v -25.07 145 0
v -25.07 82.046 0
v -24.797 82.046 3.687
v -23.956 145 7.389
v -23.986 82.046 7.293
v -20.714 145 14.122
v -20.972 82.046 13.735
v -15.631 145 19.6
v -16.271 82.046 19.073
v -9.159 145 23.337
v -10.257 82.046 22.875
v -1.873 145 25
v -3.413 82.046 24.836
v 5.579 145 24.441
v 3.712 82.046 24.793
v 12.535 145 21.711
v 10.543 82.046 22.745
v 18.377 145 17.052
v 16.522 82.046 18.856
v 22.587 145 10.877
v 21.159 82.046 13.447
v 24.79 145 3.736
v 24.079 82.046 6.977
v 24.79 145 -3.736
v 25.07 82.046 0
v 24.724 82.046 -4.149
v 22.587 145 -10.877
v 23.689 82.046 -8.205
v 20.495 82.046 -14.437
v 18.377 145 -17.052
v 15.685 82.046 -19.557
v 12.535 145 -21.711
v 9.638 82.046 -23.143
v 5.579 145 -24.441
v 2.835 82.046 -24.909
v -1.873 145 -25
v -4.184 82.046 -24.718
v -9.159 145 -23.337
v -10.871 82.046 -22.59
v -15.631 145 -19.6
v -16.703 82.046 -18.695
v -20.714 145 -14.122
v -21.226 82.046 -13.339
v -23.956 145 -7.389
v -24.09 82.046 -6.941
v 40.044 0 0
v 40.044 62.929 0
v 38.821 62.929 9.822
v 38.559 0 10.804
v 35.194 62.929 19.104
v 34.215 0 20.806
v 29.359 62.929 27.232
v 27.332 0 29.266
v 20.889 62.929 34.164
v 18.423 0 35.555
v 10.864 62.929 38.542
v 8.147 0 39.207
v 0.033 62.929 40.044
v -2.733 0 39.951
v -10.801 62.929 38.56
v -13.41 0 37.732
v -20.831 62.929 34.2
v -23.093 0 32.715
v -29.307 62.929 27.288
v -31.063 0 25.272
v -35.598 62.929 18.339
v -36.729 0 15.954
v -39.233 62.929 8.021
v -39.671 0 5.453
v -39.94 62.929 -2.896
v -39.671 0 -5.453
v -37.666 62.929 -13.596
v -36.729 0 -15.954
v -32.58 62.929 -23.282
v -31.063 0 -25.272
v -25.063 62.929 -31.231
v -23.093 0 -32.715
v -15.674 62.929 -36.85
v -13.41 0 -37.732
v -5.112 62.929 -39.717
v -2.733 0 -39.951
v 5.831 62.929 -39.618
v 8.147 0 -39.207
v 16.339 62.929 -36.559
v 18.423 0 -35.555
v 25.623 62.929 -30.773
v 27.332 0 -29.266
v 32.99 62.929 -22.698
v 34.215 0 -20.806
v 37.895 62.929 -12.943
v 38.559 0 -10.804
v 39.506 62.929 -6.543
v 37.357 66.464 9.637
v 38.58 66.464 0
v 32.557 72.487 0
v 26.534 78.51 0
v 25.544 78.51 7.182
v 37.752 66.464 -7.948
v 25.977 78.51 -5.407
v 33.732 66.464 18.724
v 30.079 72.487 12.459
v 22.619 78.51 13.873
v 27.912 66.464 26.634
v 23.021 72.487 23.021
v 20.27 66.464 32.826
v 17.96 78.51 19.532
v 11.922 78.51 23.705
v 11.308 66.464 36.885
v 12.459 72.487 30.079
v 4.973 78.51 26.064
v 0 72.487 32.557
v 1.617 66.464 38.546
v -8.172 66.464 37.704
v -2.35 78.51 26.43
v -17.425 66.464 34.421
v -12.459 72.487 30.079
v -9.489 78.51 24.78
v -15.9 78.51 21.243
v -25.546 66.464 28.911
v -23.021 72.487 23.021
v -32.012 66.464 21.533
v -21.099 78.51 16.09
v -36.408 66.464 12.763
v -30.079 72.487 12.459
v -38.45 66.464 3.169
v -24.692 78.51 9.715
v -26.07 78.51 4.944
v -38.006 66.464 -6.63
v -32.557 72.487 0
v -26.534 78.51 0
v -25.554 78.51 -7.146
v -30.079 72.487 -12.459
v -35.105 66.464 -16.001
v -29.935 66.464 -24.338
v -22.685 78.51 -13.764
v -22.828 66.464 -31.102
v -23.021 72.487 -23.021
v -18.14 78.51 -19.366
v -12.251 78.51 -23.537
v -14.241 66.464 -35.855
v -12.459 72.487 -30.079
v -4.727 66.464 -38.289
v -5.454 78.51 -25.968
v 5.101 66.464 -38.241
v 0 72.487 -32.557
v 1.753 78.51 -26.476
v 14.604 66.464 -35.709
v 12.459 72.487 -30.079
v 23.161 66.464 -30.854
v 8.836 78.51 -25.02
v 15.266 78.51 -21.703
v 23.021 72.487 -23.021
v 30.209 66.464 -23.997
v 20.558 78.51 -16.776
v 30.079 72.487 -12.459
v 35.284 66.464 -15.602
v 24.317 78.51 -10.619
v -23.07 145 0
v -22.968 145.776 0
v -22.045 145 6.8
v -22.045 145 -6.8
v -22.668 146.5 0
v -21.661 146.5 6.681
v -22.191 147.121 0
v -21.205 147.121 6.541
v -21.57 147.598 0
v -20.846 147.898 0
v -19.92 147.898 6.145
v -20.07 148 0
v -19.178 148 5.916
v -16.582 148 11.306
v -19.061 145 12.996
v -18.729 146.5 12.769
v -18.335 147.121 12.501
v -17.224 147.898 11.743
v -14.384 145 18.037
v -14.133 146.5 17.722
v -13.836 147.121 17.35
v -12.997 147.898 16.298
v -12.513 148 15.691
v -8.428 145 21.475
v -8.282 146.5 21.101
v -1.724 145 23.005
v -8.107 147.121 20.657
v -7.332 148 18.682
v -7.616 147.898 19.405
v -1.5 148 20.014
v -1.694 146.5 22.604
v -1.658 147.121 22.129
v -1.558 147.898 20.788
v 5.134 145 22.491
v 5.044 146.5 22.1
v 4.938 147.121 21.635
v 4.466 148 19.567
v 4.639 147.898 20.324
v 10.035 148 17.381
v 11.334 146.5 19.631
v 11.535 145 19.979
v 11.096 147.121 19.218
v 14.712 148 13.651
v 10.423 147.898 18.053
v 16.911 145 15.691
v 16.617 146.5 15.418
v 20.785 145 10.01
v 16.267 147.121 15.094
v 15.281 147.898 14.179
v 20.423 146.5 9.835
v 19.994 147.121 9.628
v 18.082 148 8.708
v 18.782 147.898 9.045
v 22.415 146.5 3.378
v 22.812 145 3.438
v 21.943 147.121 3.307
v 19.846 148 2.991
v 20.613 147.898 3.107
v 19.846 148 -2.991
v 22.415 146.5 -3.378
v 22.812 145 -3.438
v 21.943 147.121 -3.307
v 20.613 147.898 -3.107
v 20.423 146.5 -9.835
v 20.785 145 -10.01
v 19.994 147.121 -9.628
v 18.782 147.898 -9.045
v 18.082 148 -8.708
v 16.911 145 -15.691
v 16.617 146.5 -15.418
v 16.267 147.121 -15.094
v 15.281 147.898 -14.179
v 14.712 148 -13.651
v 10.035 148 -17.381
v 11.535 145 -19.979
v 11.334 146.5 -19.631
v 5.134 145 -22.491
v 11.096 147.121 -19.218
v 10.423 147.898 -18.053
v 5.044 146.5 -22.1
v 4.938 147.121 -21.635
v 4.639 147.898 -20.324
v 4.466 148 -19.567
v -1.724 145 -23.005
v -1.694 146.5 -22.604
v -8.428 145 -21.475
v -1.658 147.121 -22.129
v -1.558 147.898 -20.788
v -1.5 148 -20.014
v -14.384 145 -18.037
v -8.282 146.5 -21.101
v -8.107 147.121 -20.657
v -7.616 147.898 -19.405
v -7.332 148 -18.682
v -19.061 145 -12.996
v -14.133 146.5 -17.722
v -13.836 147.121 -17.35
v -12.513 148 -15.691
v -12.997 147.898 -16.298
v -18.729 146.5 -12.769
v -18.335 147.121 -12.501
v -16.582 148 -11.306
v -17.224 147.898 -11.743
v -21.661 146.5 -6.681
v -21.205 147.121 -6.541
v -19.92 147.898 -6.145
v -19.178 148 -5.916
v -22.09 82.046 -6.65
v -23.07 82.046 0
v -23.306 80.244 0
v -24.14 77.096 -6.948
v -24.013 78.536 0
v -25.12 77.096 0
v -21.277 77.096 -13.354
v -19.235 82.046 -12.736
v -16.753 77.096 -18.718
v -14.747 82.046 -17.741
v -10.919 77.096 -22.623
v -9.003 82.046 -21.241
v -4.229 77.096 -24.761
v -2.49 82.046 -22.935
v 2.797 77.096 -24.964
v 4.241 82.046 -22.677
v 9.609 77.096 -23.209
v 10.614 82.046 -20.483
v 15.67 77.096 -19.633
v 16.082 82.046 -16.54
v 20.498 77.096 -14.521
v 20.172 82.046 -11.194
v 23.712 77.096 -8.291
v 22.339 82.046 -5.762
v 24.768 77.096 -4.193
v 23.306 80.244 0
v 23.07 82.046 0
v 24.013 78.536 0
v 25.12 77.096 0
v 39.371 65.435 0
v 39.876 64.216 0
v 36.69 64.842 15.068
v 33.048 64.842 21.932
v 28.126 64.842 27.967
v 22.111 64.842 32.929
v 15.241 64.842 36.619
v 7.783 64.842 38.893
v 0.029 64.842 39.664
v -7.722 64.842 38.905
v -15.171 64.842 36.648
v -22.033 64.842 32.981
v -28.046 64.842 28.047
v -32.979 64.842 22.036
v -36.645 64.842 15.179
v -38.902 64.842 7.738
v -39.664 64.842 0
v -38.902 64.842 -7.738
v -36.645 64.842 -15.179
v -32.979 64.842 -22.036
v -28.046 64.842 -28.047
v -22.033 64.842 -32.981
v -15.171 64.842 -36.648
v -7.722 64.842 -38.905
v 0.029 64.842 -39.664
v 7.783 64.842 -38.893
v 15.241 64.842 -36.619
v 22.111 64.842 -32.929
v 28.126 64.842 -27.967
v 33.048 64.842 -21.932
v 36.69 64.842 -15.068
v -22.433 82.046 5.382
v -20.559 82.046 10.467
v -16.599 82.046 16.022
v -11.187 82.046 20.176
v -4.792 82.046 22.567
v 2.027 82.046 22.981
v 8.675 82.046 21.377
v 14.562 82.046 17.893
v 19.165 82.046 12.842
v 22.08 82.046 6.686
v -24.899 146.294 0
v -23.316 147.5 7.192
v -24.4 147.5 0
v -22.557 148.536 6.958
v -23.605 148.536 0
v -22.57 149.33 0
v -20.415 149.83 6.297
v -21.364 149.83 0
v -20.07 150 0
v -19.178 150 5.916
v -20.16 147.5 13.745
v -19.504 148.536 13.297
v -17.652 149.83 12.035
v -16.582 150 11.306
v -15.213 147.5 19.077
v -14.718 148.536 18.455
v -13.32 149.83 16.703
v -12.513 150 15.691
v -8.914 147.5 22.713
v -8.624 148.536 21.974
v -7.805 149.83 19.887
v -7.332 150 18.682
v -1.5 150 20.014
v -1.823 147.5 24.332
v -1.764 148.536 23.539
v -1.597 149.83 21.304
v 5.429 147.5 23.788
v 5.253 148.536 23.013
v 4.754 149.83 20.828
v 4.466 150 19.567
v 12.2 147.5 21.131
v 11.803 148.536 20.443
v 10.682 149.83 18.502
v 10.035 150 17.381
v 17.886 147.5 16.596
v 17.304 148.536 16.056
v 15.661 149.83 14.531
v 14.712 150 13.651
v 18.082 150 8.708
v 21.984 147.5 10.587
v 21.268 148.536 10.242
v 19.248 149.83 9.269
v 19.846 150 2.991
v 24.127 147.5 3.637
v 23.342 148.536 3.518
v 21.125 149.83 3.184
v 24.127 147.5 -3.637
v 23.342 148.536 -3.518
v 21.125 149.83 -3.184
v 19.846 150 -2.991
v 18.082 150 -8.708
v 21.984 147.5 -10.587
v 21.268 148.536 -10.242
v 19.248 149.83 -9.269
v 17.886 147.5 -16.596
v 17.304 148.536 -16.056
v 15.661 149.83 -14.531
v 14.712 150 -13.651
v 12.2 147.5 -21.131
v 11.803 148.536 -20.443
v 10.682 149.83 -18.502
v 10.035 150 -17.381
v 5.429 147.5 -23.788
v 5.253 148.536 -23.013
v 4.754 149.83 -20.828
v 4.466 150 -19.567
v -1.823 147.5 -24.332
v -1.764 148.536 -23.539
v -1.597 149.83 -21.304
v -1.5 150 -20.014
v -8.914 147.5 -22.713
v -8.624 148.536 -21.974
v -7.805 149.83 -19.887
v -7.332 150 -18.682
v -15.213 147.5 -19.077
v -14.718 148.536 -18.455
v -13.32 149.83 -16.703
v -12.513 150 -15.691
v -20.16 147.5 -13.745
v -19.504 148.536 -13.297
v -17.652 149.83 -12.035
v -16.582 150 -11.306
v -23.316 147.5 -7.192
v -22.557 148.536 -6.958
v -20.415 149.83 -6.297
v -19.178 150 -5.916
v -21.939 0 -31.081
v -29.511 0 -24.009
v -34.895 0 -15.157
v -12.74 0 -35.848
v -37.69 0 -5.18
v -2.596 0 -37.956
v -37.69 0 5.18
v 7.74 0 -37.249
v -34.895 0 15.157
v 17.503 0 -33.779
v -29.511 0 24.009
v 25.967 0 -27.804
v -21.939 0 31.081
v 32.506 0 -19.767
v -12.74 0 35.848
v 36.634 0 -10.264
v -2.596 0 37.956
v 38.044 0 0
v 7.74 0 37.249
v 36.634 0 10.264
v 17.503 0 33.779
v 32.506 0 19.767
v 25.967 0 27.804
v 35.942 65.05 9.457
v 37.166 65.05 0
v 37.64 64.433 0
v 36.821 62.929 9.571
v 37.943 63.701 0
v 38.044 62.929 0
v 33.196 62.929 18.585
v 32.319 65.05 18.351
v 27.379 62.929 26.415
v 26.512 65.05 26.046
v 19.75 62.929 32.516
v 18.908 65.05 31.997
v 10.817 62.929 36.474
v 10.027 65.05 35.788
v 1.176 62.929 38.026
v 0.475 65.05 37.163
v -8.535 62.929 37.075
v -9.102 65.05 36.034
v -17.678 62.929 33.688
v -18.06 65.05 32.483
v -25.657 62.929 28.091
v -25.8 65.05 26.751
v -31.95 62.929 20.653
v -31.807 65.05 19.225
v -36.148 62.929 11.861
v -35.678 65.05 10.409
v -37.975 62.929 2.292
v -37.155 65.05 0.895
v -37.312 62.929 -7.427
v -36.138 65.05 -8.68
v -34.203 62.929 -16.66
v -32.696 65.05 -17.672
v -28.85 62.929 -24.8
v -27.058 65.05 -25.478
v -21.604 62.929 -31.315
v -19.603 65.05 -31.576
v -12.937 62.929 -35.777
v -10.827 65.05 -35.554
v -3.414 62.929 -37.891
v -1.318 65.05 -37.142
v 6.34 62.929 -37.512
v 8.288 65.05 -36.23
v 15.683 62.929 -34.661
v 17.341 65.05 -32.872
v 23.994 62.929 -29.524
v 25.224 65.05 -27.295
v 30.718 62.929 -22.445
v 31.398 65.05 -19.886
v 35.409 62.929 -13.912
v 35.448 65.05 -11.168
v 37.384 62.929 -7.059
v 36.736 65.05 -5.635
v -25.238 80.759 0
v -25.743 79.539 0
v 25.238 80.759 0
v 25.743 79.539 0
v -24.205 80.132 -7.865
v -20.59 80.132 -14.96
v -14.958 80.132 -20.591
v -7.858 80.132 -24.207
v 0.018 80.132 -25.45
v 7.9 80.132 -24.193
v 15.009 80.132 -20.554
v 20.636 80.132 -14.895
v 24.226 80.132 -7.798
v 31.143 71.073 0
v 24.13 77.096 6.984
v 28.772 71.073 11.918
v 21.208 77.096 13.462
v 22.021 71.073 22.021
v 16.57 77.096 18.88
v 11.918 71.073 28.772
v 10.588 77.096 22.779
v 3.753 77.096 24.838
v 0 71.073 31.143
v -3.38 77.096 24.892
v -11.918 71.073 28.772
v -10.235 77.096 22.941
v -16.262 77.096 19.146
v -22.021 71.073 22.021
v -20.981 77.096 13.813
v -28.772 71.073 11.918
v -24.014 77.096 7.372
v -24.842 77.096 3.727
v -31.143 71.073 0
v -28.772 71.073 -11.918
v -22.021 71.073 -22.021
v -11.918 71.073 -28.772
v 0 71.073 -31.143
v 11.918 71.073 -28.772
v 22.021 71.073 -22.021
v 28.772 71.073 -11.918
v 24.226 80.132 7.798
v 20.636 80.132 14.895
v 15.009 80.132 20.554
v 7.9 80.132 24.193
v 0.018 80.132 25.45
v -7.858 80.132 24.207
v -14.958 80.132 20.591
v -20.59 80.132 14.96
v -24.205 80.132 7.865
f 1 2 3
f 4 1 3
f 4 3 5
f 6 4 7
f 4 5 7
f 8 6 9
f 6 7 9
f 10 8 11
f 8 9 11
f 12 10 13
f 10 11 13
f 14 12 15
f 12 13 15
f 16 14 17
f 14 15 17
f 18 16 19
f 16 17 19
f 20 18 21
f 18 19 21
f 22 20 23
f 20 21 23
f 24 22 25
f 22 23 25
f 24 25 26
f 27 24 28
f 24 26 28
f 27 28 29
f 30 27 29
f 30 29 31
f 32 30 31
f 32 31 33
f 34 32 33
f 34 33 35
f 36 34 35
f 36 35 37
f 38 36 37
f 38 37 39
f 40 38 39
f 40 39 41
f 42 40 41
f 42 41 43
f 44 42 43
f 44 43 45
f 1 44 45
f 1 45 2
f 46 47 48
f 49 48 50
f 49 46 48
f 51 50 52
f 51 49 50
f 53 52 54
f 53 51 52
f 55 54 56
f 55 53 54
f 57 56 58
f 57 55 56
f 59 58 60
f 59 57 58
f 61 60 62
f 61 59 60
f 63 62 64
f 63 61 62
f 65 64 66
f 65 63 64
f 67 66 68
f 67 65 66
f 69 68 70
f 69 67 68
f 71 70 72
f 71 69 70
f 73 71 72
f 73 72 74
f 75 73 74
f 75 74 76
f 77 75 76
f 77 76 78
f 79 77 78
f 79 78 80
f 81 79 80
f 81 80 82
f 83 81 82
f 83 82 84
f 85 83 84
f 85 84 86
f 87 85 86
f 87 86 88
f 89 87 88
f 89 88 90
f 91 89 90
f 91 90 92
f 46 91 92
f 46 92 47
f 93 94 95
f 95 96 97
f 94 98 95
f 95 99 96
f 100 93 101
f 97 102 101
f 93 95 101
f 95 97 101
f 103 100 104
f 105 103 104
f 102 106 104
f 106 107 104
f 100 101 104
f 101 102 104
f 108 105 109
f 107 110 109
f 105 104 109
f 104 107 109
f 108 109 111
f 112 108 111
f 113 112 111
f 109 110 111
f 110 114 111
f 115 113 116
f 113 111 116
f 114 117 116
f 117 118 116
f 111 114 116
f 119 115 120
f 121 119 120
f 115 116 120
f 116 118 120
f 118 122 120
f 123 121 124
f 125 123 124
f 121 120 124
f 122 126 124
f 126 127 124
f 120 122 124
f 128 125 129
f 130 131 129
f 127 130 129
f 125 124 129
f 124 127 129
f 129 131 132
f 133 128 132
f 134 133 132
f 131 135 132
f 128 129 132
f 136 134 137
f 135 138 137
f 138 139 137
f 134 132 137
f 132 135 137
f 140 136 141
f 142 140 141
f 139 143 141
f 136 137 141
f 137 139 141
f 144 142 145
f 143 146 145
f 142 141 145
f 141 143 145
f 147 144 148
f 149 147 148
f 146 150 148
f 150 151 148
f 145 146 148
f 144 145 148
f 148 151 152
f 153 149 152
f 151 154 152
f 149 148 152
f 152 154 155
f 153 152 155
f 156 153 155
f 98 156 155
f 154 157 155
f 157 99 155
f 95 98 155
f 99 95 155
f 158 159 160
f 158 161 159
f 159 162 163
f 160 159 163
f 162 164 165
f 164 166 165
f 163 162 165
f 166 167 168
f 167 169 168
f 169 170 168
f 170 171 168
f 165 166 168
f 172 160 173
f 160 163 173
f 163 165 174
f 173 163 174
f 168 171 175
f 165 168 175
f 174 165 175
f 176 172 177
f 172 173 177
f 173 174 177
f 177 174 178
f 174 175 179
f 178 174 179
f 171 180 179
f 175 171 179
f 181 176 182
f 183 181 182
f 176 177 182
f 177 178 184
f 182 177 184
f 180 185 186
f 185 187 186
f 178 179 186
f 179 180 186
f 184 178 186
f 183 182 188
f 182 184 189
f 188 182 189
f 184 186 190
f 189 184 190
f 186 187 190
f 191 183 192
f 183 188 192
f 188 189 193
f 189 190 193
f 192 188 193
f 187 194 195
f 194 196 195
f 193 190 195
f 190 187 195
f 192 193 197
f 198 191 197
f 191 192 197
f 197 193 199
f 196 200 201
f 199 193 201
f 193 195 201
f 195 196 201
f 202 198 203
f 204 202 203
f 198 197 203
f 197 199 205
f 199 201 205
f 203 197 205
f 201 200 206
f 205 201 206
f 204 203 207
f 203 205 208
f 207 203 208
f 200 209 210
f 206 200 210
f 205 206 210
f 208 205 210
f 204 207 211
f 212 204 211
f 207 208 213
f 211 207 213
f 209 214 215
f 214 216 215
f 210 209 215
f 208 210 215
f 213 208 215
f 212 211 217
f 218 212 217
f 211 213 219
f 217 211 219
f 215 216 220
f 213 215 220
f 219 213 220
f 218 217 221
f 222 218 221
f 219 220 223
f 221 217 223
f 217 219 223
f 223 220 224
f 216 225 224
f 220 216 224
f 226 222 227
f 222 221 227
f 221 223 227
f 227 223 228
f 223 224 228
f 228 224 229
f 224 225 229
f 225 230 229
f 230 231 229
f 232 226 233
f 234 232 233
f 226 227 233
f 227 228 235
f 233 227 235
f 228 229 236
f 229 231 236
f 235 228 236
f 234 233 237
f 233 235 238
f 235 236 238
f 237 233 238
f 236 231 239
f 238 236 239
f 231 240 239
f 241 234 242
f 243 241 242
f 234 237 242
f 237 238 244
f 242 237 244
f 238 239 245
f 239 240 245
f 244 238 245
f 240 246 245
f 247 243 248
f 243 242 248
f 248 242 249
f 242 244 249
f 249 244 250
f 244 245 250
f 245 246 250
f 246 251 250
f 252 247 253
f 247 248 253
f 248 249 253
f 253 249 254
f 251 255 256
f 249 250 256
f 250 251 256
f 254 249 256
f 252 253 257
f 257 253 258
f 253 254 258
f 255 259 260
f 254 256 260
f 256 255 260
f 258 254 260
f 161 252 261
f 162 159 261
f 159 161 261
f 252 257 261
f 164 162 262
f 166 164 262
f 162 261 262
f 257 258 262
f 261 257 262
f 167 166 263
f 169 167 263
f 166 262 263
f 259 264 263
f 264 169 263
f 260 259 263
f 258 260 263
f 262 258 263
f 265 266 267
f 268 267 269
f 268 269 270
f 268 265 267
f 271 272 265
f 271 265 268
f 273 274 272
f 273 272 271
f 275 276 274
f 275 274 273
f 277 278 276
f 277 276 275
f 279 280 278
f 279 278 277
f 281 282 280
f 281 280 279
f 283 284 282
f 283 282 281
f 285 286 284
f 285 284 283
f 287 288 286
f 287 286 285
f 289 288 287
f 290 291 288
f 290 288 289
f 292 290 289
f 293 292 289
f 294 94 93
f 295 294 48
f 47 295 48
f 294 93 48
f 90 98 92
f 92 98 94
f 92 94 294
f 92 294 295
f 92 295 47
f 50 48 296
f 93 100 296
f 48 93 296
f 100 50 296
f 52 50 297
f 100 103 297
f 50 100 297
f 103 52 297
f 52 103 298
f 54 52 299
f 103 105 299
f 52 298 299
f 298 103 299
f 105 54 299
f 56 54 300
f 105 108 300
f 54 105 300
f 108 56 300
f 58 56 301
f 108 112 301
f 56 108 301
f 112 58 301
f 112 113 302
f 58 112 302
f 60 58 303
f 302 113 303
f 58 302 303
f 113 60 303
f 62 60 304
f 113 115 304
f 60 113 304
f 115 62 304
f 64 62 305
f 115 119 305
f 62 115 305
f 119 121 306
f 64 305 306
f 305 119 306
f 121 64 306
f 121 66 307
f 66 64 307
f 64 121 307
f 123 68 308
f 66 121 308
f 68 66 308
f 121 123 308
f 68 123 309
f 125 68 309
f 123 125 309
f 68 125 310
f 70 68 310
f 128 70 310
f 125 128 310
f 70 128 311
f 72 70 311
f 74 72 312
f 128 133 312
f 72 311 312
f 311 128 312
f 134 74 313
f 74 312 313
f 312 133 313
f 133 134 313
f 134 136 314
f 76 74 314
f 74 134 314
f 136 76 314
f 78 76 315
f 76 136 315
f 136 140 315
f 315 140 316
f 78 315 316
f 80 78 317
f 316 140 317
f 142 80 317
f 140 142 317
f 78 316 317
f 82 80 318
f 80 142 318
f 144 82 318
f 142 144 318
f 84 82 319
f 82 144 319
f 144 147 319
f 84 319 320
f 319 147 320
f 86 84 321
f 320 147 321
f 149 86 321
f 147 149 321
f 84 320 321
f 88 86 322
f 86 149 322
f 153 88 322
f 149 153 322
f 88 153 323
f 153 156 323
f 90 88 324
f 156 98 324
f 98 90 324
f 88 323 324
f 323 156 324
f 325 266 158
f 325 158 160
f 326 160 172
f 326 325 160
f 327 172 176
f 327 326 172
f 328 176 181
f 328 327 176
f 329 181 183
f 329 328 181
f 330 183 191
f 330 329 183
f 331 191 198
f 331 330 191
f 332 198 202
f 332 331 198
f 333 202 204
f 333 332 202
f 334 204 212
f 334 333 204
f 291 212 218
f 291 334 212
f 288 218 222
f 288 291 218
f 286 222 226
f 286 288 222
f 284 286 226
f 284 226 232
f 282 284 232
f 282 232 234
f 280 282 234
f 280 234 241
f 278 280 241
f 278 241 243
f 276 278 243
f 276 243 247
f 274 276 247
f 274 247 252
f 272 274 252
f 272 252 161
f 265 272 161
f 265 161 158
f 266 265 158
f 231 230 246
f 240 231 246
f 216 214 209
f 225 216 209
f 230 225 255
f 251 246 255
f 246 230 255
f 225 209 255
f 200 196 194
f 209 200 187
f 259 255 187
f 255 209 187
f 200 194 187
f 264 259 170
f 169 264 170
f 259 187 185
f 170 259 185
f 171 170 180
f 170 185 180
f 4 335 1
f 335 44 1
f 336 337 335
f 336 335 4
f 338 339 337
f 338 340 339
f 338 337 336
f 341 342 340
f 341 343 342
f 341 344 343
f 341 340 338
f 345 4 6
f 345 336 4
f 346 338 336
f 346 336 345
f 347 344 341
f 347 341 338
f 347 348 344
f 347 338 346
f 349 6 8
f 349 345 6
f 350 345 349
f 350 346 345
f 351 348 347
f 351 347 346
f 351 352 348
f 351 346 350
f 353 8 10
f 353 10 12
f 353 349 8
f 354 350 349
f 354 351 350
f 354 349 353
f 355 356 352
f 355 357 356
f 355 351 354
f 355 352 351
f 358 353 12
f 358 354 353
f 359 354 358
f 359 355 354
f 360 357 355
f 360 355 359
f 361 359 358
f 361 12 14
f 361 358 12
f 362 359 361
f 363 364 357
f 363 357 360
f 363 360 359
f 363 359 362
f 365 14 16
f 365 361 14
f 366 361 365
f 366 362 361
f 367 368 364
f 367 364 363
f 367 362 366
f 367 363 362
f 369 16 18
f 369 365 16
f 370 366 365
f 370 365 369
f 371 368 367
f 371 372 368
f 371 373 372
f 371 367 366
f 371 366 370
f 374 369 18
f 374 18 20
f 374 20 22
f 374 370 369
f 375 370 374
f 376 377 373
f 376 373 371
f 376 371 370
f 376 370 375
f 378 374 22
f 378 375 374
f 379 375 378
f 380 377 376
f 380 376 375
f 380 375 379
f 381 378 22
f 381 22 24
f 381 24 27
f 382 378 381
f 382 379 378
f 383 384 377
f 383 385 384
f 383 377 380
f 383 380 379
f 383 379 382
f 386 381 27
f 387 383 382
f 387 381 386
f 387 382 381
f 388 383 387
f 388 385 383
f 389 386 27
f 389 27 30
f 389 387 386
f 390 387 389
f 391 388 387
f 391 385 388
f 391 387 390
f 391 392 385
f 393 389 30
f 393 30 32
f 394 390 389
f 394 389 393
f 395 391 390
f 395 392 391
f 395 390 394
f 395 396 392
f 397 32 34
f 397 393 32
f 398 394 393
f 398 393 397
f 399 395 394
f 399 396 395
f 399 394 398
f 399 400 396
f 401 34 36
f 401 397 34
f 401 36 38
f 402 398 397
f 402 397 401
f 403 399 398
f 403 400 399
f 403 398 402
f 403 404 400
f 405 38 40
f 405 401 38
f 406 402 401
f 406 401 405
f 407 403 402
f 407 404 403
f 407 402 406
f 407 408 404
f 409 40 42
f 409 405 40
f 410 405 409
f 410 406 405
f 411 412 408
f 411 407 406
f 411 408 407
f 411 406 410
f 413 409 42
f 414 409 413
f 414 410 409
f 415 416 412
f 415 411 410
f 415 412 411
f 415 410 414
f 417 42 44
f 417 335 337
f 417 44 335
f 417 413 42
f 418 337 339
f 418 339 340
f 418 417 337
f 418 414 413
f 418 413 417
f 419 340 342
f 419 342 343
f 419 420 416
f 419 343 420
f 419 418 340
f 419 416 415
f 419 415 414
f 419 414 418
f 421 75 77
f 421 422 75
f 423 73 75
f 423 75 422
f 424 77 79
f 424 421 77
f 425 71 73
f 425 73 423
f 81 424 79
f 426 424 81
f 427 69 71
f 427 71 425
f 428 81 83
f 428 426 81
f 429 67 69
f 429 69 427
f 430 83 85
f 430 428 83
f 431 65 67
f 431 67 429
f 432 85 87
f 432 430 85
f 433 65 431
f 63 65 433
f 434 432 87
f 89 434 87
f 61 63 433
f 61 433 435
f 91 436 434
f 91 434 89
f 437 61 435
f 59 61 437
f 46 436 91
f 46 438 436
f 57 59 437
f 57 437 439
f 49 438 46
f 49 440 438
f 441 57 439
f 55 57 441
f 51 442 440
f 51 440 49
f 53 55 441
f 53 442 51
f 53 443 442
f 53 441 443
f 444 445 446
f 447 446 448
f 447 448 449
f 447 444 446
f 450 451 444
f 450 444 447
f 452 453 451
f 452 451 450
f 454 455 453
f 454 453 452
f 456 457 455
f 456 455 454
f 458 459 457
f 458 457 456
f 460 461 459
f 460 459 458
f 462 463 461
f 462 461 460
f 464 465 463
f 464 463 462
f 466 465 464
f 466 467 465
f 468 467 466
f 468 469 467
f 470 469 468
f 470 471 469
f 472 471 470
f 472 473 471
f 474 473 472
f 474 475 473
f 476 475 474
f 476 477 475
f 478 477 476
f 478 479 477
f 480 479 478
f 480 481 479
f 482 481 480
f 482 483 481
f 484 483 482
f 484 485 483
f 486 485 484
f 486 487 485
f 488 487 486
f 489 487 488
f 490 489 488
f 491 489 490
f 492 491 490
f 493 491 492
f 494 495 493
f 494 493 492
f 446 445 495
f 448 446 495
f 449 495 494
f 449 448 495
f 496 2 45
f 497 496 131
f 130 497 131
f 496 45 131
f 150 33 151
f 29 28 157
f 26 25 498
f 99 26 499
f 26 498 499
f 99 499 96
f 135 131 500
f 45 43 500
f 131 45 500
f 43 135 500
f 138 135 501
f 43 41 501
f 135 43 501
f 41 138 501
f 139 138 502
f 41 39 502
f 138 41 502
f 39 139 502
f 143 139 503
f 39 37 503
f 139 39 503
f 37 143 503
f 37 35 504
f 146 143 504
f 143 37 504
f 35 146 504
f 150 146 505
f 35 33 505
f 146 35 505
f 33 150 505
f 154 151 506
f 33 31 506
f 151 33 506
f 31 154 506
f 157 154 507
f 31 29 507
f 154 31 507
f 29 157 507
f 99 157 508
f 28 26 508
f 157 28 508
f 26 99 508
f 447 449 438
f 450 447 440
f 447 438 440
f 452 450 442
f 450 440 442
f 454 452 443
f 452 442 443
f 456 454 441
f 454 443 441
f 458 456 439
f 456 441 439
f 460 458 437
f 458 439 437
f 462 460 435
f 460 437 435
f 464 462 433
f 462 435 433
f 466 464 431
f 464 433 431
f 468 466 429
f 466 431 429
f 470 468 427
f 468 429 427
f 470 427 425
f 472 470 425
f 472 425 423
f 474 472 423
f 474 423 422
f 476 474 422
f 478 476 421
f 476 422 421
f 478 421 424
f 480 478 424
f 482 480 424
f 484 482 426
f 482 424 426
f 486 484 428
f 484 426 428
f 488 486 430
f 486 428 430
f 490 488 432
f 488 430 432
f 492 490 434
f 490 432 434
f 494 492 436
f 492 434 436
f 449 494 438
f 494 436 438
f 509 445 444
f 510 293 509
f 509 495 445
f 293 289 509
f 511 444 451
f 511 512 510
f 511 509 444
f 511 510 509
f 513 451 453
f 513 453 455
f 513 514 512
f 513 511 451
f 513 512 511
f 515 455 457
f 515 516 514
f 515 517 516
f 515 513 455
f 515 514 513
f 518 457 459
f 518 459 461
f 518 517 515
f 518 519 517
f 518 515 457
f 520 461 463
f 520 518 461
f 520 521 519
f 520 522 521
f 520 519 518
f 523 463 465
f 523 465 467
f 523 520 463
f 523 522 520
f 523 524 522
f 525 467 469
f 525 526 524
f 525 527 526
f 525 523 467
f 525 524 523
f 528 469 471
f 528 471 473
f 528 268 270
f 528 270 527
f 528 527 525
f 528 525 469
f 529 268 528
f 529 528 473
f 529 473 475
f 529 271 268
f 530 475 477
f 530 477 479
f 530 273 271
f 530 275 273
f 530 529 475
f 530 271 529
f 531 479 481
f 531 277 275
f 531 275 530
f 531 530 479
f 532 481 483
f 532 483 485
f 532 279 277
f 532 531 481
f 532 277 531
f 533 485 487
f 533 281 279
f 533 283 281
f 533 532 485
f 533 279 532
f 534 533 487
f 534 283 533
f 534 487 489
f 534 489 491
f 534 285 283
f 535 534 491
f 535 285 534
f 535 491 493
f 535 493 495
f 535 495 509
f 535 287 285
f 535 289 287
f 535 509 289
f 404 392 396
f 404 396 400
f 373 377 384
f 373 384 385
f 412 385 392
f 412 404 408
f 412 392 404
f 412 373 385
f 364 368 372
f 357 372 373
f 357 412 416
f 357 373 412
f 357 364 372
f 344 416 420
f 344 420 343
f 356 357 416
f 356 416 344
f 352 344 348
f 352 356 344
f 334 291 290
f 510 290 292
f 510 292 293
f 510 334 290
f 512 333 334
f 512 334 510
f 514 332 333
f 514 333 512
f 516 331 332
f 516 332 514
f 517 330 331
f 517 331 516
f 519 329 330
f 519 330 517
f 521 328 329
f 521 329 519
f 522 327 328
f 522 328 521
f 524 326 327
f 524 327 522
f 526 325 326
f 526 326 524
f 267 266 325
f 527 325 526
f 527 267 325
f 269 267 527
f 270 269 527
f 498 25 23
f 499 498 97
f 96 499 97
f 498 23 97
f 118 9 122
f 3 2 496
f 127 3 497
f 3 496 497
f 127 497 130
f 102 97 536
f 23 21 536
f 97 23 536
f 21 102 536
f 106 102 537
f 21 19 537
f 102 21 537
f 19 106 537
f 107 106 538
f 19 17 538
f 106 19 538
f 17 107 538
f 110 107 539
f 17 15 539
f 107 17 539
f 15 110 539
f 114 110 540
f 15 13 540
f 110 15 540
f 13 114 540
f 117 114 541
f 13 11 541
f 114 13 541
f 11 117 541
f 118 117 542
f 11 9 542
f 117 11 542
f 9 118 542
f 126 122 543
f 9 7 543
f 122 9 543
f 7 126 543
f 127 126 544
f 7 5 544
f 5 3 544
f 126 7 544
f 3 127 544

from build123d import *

# Parameters (mm, degrees)
F0_R        = 40.0443714264
F1_DEPTH    = 80
F2_R        = 25.0697968859
F3_DEPTH    = 70
F4_S5_R     = 25.0697968859
F4_T6_DEPTH = 59
F5_R        = 5
F6_R        = 5
F7_T        = -2


# Not quite as in the source:
# - a fillet or chamfer that OpenCascade refuses, or shapes differently, is made with other operations: its cross-section is extruded or revolved along the edge and cut away or added


with BuildPart() as f1:
    # F0 (on Front) → F1 (new body)
    with BuildSketch(Plane.XZ):
        Circle(F0_R)
    extrude(amount=-F1_DEPTH)

    # F2 (on face) → F3 (join)
    with BuildSketch(Plane(origin=(0, 80, 0), x_dir=(-1, 0, 0), z_dir=(0, 1, 0))):
        Circle(F2_R)
    extrude(amount=F3_DEPTH)

    # F4: chamfer of 15 on 1 edges, made by hand


with BuildPart() as f4_tool2:
    # F4_s3 → F4_t4 (revolve)
    with BuildSketch(Plane.XY):
        Polygon((40.0443714264, 65), (25.0443714264, 80), (40.0443714264, 80), align=None)
    revolve(axis=Axis((0, 80, 0), (0, -1, 0)))

    # F4_s5 → F4_t6 (cut, symmetric)
    with BuildSketch(Plane.XZ.offset(-72.5)):
        Circle(F4_S5_R)
    extrude(amount=F4_T6_DEPTH, both=True, mode=Mode.SUBTRACT)


with BuildPart() as f1_1:
    add(f1.part)

    # F4_t1: cut F4_tool2
    add(f4_tool2.part, mode=Mode.SUBTRACT)

    # F5
    f5_edges = [f1_1.edges().sort_by_distance(p)[0] for p in [
        (25.069797, 150, 0),
    ]]
    fillet(f5_edges, radius=F5_R)

    # F6
    f6_edges = [f1_1.edges().sort_by_distance(p)[0] for p in [
        (32.557084, 72.487287, 0),
        (-25.069797, 79.974575, 0),
        (-40.044371, 65, 0),
    ]]
    fillet(f6_edges, radius=F6_R)

    # F7
    f7_openings = [f1_1.faces().sort_by_distance(p)[0] for p in [
        (0, 0, 0),
    ]]
    offset(amount=F7_T, openings=f7_openings)


solid = f1_1.part
